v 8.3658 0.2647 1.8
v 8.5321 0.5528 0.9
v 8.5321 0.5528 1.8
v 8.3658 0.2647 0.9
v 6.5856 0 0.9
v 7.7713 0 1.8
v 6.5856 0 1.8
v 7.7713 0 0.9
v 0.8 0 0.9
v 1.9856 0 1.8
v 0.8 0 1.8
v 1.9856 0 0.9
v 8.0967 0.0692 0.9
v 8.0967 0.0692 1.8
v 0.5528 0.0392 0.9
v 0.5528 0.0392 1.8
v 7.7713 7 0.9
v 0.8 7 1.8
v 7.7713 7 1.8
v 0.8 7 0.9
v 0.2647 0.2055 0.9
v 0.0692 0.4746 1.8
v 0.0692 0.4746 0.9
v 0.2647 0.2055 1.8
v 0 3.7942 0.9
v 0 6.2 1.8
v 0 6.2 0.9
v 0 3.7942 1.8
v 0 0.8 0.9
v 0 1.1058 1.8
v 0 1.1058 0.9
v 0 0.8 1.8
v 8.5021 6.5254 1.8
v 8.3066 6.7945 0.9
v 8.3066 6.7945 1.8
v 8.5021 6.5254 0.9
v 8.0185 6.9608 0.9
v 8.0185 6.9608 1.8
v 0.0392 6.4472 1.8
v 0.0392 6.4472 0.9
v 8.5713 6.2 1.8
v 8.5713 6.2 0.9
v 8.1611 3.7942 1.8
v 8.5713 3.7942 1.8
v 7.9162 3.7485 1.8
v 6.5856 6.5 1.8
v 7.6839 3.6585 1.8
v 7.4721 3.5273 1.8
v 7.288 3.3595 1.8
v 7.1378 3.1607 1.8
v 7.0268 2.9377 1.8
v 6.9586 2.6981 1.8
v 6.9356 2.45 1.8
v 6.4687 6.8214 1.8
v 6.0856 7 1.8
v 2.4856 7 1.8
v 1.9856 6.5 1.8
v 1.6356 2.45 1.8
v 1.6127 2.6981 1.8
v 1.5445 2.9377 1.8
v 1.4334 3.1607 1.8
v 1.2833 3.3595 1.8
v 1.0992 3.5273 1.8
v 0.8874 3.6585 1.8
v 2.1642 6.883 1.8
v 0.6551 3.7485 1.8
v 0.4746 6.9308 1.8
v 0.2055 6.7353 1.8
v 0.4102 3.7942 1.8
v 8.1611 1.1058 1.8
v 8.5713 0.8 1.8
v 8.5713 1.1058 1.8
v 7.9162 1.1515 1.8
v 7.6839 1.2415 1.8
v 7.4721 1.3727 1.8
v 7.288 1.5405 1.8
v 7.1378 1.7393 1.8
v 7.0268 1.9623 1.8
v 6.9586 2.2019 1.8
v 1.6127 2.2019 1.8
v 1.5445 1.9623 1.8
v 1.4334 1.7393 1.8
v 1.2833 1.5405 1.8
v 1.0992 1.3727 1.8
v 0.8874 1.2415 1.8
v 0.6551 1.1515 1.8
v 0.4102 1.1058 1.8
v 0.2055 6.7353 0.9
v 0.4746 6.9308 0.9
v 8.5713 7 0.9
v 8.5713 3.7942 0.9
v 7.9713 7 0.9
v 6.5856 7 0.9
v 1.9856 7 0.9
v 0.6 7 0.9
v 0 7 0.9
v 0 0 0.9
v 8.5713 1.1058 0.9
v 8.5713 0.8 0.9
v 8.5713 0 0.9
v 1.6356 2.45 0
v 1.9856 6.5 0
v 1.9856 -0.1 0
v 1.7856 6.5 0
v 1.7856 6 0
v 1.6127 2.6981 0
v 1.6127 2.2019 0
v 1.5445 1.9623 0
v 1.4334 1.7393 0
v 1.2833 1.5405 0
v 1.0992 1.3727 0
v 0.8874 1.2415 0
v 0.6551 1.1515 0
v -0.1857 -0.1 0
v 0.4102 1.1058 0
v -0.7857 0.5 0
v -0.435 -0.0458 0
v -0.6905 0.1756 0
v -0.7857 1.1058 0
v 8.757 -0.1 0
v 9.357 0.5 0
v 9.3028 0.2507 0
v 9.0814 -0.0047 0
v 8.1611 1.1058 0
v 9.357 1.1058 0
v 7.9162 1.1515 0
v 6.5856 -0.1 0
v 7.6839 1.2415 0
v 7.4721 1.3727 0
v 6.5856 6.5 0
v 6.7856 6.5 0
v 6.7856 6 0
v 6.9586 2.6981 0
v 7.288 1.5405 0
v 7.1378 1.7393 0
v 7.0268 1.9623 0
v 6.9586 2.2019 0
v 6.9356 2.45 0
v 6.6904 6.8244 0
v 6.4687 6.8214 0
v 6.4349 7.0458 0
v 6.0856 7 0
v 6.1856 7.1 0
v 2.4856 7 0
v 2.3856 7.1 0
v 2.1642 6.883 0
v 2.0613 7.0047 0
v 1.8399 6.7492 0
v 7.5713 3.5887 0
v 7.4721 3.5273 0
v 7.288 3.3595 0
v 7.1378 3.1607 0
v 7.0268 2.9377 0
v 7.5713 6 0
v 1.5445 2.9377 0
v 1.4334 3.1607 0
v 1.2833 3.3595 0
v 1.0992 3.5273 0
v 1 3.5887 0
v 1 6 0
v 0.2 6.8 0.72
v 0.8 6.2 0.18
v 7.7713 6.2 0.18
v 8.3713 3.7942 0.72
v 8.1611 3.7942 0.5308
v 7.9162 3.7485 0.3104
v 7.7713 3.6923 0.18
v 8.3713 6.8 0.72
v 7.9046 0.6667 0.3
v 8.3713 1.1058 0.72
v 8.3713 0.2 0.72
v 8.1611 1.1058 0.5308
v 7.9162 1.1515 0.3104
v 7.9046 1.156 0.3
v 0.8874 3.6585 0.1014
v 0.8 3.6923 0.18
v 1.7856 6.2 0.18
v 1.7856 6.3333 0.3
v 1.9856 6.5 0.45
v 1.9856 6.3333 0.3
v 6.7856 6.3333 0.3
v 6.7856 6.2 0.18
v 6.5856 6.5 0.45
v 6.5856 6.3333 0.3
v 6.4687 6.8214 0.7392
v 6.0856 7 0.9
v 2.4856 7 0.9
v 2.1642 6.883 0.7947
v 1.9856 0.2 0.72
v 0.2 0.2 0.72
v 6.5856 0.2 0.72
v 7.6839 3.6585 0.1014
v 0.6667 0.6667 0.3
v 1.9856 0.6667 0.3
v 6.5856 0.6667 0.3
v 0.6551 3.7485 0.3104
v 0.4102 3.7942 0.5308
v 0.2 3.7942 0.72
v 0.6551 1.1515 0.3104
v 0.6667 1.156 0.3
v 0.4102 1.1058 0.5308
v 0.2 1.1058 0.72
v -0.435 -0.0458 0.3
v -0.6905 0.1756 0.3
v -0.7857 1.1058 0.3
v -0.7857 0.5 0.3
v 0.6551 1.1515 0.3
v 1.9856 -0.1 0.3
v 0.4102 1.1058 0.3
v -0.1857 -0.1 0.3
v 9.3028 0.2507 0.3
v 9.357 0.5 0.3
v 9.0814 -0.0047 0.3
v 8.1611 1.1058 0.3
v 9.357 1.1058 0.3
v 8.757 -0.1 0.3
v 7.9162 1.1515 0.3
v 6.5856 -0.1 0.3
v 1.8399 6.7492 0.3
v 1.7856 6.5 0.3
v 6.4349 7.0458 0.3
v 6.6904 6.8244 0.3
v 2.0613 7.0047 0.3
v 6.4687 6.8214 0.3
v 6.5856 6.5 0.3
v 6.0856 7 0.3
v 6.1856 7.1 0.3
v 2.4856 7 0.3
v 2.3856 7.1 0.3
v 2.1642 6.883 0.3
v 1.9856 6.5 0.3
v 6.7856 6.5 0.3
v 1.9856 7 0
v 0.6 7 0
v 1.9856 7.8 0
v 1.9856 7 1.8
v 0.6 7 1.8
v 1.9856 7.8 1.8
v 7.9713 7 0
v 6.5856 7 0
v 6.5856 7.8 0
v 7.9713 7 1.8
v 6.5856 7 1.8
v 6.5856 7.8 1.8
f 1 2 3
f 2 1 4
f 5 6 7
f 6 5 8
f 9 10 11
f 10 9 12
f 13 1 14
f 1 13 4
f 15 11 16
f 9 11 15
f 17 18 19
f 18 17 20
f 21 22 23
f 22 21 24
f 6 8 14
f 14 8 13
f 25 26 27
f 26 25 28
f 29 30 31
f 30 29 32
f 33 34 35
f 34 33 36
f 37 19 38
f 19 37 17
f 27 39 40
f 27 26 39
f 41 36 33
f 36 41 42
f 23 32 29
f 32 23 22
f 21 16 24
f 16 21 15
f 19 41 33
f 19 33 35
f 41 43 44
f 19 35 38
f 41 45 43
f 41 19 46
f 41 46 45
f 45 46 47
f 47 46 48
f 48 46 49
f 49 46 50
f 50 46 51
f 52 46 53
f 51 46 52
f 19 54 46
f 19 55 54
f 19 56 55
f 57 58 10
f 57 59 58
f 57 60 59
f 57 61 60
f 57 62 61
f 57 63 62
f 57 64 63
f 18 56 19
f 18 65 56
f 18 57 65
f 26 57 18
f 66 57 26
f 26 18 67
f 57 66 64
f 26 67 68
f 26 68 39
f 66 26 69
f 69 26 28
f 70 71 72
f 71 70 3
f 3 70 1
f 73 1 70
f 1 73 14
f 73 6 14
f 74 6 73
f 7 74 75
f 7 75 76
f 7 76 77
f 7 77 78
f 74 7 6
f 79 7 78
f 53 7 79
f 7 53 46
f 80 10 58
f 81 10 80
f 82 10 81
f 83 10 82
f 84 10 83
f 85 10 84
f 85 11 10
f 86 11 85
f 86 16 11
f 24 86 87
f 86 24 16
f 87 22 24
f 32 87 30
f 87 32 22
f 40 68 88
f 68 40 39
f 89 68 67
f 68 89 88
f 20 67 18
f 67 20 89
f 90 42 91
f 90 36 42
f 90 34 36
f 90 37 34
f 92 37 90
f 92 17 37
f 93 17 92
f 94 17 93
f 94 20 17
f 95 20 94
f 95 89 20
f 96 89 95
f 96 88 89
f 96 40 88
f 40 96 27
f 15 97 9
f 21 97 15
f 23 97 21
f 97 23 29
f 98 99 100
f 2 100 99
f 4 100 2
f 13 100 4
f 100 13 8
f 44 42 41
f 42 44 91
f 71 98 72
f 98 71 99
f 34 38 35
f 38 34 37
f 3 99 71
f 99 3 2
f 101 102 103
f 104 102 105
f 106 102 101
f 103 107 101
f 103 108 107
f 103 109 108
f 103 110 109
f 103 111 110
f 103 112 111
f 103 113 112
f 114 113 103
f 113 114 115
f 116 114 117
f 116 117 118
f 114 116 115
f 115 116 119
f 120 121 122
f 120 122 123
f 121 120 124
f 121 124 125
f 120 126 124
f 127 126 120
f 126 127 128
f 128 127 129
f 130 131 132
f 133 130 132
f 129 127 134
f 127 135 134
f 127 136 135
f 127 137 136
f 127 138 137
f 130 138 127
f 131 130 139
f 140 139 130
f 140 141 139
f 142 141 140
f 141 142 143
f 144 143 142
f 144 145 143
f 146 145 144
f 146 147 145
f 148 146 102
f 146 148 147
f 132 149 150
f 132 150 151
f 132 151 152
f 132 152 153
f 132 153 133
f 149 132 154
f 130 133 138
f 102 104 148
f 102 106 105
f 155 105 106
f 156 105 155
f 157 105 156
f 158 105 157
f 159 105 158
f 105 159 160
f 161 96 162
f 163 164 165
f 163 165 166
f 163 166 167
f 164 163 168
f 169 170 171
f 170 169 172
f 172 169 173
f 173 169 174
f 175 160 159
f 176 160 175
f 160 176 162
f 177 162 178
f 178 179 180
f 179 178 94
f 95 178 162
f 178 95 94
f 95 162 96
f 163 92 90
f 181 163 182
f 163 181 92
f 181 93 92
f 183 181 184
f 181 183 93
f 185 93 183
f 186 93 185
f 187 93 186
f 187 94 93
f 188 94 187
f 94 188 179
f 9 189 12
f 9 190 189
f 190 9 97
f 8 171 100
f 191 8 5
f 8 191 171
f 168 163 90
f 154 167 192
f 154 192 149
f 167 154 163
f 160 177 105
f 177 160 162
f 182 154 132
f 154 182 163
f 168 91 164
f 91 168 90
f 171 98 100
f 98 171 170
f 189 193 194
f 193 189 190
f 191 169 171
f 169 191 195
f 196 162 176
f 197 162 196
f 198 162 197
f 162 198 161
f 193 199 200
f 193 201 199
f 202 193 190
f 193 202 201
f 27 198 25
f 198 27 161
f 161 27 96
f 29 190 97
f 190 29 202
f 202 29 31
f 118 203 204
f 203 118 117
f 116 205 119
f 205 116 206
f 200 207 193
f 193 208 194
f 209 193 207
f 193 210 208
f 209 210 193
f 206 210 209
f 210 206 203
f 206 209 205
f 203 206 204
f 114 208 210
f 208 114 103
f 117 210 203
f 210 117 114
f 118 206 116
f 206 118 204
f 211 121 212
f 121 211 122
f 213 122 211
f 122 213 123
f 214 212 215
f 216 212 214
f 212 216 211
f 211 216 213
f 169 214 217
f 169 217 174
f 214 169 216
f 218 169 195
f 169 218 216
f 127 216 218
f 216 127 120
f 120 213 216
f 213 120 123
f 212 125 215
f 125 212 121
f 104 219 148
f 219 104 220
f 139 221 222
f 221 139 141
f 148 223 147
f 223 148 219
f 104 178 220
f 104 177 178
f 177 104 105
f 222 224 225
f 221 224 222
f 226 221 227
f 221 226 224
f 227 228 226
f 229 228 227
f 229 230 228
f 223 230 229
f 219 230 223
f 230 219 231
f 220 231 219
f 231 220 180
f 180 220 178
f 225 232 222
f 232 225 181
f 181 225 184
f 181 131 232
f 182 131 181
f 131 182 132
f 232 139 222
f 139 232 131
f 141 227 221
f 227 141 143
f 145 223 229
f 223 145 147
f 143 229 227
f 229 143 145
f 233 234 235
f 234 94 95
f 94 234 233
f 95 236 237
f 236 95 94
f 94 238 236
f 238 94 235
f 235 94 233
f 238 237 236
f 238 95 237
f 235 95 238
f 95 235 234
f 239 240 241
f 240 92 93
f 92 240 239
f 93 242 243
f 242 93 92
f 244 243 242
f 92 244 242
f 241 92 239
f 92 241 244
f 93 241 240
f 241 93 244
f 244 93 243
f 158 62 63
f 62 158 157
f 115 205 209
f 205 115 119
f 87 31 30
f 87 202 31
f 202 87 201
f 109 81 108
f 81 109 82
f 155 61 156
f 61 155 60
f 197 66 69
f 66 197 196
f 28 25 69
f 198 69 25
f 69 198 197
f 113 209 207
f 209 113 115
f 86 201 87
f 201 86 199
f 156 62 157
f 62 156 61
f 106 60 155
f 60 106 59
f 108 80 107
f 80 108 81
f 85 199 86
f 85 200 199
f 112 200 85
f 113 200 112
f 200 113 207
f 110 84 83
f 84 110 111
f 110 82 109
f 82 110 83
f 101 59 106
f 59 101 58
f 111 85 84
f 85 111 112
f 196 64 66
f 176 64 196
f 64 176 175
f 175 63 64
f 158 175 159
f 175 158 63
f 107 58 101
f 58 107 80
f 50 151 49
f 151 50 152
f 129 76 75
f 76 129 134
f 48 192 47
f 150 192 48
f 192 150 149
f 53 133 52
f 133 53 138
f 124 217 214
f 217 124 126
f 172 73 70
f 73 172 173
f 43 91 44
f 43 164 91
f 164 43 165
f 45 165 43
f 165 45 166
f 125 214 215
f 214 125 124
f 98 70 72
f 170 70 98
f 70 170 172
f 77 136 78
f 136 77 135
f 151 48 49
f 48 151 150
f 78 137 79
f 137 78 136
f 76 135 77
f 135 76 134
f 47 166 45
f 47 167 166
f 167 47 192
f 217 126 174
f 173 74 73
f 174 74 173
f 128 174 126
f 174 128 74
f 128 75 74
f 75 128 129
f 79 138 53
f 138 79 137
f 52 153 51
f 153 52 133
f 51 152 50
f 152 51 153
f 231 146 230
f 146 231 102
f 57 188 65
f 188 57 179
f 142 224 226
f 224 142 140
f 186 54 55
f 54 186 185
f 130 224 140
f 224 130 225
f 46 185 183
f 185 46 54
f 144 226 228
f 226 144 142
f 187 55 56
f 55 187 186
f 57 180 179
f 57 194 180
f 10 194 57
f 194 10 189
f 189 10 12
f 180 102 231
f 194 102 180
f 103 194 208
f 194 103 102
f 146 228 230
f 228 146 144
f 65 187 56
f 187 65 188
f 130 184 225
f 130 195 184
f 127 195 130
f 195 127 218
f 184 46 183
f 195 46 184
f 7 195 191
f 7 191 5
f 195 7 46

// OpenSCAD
// =============================================
// 3D: pressure pad lifter (PETG)
// Version: 1.0
// =============================================

use <../modules.scad>;

// ===== Short description =====
description = "Frame lifter to deflect cassette pressure pad by A while keeping ≥0.30mm tape clearance";
version_str = "1.0";

// ===== Точность аппроксимации окружностей =====
$fn = 0;        // фиксированную сегментацию отключаем
$fa = 6;        // 5–8° обычно достаточно
$fs = 0.35;     // ≈ диаметр сопла (0.3–0.5 для сопла 0.4)
pin_fs = 0.25;  // чуть тоньше для штырей и отверстий

// ===== Режим печати тест‑фрагментов =====
test_fragment = false;   // true — печатать только угловые фрагменты (base+frame)
frag_size     = 20;      // размер квадрата вырезки, мм
frag_index    = 0;       // 0=НЛ, 1=ВЛ, 2=НП, 3=ВП (относительно основания)
frag_gap_x    = 10;      // зазор между фрагментами по X, мм
frag_h_extra  = 20;      // запас по высоте клипа, мм

// ===== Общие доп. параметры =====
tiny = 0.1;                  // небольшой зазор для булевых операций
edge_chamfer_z = 1;       // высота фаски по Z (мм)
edge_chamfer_x = 5;       // горизонтальный вылет фаски по X (с каждой стороны), мм
edge_chamfer_y = 5;       // горизонтальный вылет фаски по Y (с каждой стороны), мм
screen_frame_gap = 0.2;      // только для высоты вычитаний в рамке (не влияет на XY)

// =============================================
// ===== Параметры модели (все размеры в мм) =====
// Геометрия головы
W_head = 4.0;          // ширина рабочей части головы
H_head = 9.0;          // высота корпуса в зоне окна
C_gap  = 0.6;          // суммарный зазор окна относительно головы (и по X, и по Z)

// Кинематика лифтера
A = 0.8;               // вынос скосов вперед от плоскости лица головы
B_deg = 30;            // угол скоса щёк (25/30/35)
D_radius = 0.5;        // радиус скругления кромок контакта с подушкой (R0.5–R1.0)
t = 1.8;               // толщина рамки по Z
depth_y = 7.0;         // глубина рамки вдоль движения ленты (6–8 рекоменд.)

// Крепление
screw_pitch = 12.0;    // межосевое расстояние отверстий (9–14)
screw_slot_len = 4.0;  // длина продольного паза
screw_diameter = 2.5;  // 2.0 для M2, 2.5 для M2.5
slot_w_m2   = 2.2;     // ширина паза под M2
slot_w_m25  = 2.7;     // ширина паза под M2.5
both_screw_variants = false; // если true — вырезать оба варианта пазов

// Монтажные подпятники (VHB опора)
pad_h = 0.3;           // высота микроподпятников
pad_size = [5, 3];     // размер подпятников (X,Y)

// Безопасный зазор до ленты
clearance_tape = 0.30; // минимальный зазор до ленты

// Каркас рамки
min_ring_x = 1.6;      // минимальная ширина рамки по X с каждой стороны
outer_corner_r = 0.8;  // скругление внешних углов

// ===== Вычисляемые размеры =====
inner_w = W_head + C_gap;     // окно по X
inner_h = H_head + C_gap;     // окно по Z

// Пробег щеки по X для получения выноса A при угле B: run = A / tan(B)
cheek_run_x = (B_deg > 0) ? (A / tan(B_deg)) : 0;
ring_x = max(min_ring_x, cheek_run_x + 0.6);  // запас, чтобы поместить скос
outer_x = inner_w + 2*ring_x;                 // полный размер по X
outer_y = depth_y + A;                        // спереди добавка A под щёки
outer_h = t + pad_h;                          // высота с подпятниками

inner_x0 = (outer_x - inner_w)/2;            // левый X окна
inner_x1 = inner_x0 + inner_w;                // правый X окна
front_y  = depth_y;                           // фронт плиты (до скосов)

// Отладка
echo("cheek_run_x:", cheek_run_x, "; ring_x:", ring_x, "; outer_x:", outer_x, "; outer_y:", outer_y);
echo("Tape clearance target >=", clearance_tape, "mm; A:", A, "; angle:", B_deg);

// =============================================
// ===== Вспомогательные модули =====

// Продольный паз по X через оболочку из двух цилиндров
module slot_x(center, len, width, h){
    cx = center[0]; cy = center[1];
    r = width/2;
    hull(){
        translate([cx - len/2, cy, 0]) cylinder(h=h, r=r, $fs=fs_pin(), $fa=6);
        translate([cx + len/2, cy, 0]) cylinder(h=h, r=r, $fs=fs_pin(), $fa=6);
    }
}

// Микроподпятник (RR пластинка)
module micro_pad_xy(at=[0,0], size=[5,3], h=0.3, r=0.6){
    translate([at[0]-size[0]/2, at[1]-size[1]/2, 0])
        rr_extrude(size=size, r=r, h=h);
}

// Щека-треугольник у внутреннего окна, слева/справа
// side = -1 (левая), +1 (правая)
module cheek(side=1){
    x_edge = (side < 0) ? inner_x0 : inner_x1;   // внутренняя кромка щёки
    // Треугольник в XY: вершины у фронта плиты и выноса A
    polygon_pts = (side < 0)
        ? [[x_edge, front_y], [x_edge, front_y + A], [max(x_edge - cheek_run_x, 0), front_y]]
        : [[x_edge, front_y], [x_edge, front_y + A], [min(x_edge + cheek_run_x, outer_x), front_y]];
    linear_extrude(height=t)
        polygon(points=polygon_pts);
}

// Внутреннее окно (скругление углов D_radius)
module inner_window(){
    translate([inner_x0, front_y - inner_h])
        rr_extrude(size=[inner_w, inner_h], r=D_radius, h=t + screen_frame_gap);
}

// Внешний контур плиты (с опциональной нижней фаской)
module outer_plate(){
    // Плита тела: [0..outer_x] x [0..depth_y]
    chamfered = edge_chamfer_z > 0 ? edge_chamfer_z : 0;
    module base_plate(){ rr_extrude(size=[outer_x, depth_y], r=outer_corner_r, h=t); }
    if (chamfered > 0){
        chamfer_rr_extrude(size=[outer_x, depth_y], h=t, r=outer_corner_r, ch=chamfered);
    } else {
        base_plate();
    }
}

// Два паза под винты (X‑продольные), один комплект — по screw_diameter
module screw_slots(){
    w_sel = (abs(screw_diameter - 2.0) < 0.01) ? slot_w_m2 : slot_w_m25;
    y_center = depth_y * 0.35;
    x_left = outer_x/2 - screw_pitch/2;
    x_right = outer_x/2 + screw_pitch/2;

    // Основной комплект по выбранному диаметру
    slot_x([x_left,  y_center], len=screw_slot_len, width=w_sel, h=t + screen_frame_gap);
    slot_x([x_right, y_center], len=screw_slot_len, width=w_sel, h=t + screen_frame_gap);

    // Опционально — второй комплект
    if (both_screw_variants){
        slot_x([x_left,  y_center], len=screw_slot_len, width=slot_w_m2,  h=t + screen_frame_gap);
        slot_x([x_right, y_center], len=screw_slot_len, width=slot_w_m2,  h=t + screen_frame_gap);
        slot_x([x_left,  y_center], len=screw_slot_len, width=slot_w_m25, h=t + screen_frame_gap);
        slot_x([x_right, y_center], len=screw_slot_len, width=slot_w_m25, h=t + screen_frame_gap);
    }
}

// Три микроподпятника на тыльной стороне
module back_pads(){
    y1 = depth_y * 0.20; y2 = depth_y * 0.80; yc = depth_y * 0.50;
    x1 = outer_x * 0.20; x2 = outer_x * 0.80; xc = outer_x * 0.50;
    micro_pad_xy([x1, y1], size=pad_size, h=pad_h, r=0.6);
    micro_pad_xy([x2, y1], size=pad_size, h=pad_h, r=0.6);
    micro_pad_xy([xc, y2], size=pad_size, h=pad_h, r=0.6);
}

// =============================================
// ===== Фрагменты детали =====

// Главная деталь: рамка с внутренним окном, щёчными скосами, пазами и подпятниками
module base(){
    difference(){
        union(){
            // Плита
            outer_plate();
            // Щёки (вынесены на A вперёд от фронта плиты)
            cheek(side=-1);
            cheek(side=+1);
            // Подпятники
            back_pads();
        }
        // Внутреннее окно
        inner_window();
        // Пазы под винты
        screw_slots();
    }
}

// Для совместимости с принятым стилем — модуль вывода всех фрагментов
module show_all(){
    base();
}

// Обрезка на тест-фрагменты по габаритам детали
module render_all(){
    clip_for_fragments_bbox(L=outer_x, W=outer_y, H=outer_h, enabled=test_fragment, frag_size=frag_size, frag_index=frag_index, frag_h_extra=frag_h_extra){
        show_all();
    }
}

// ===== Точка входа =====
module main(){
    render_all();
}

main();
